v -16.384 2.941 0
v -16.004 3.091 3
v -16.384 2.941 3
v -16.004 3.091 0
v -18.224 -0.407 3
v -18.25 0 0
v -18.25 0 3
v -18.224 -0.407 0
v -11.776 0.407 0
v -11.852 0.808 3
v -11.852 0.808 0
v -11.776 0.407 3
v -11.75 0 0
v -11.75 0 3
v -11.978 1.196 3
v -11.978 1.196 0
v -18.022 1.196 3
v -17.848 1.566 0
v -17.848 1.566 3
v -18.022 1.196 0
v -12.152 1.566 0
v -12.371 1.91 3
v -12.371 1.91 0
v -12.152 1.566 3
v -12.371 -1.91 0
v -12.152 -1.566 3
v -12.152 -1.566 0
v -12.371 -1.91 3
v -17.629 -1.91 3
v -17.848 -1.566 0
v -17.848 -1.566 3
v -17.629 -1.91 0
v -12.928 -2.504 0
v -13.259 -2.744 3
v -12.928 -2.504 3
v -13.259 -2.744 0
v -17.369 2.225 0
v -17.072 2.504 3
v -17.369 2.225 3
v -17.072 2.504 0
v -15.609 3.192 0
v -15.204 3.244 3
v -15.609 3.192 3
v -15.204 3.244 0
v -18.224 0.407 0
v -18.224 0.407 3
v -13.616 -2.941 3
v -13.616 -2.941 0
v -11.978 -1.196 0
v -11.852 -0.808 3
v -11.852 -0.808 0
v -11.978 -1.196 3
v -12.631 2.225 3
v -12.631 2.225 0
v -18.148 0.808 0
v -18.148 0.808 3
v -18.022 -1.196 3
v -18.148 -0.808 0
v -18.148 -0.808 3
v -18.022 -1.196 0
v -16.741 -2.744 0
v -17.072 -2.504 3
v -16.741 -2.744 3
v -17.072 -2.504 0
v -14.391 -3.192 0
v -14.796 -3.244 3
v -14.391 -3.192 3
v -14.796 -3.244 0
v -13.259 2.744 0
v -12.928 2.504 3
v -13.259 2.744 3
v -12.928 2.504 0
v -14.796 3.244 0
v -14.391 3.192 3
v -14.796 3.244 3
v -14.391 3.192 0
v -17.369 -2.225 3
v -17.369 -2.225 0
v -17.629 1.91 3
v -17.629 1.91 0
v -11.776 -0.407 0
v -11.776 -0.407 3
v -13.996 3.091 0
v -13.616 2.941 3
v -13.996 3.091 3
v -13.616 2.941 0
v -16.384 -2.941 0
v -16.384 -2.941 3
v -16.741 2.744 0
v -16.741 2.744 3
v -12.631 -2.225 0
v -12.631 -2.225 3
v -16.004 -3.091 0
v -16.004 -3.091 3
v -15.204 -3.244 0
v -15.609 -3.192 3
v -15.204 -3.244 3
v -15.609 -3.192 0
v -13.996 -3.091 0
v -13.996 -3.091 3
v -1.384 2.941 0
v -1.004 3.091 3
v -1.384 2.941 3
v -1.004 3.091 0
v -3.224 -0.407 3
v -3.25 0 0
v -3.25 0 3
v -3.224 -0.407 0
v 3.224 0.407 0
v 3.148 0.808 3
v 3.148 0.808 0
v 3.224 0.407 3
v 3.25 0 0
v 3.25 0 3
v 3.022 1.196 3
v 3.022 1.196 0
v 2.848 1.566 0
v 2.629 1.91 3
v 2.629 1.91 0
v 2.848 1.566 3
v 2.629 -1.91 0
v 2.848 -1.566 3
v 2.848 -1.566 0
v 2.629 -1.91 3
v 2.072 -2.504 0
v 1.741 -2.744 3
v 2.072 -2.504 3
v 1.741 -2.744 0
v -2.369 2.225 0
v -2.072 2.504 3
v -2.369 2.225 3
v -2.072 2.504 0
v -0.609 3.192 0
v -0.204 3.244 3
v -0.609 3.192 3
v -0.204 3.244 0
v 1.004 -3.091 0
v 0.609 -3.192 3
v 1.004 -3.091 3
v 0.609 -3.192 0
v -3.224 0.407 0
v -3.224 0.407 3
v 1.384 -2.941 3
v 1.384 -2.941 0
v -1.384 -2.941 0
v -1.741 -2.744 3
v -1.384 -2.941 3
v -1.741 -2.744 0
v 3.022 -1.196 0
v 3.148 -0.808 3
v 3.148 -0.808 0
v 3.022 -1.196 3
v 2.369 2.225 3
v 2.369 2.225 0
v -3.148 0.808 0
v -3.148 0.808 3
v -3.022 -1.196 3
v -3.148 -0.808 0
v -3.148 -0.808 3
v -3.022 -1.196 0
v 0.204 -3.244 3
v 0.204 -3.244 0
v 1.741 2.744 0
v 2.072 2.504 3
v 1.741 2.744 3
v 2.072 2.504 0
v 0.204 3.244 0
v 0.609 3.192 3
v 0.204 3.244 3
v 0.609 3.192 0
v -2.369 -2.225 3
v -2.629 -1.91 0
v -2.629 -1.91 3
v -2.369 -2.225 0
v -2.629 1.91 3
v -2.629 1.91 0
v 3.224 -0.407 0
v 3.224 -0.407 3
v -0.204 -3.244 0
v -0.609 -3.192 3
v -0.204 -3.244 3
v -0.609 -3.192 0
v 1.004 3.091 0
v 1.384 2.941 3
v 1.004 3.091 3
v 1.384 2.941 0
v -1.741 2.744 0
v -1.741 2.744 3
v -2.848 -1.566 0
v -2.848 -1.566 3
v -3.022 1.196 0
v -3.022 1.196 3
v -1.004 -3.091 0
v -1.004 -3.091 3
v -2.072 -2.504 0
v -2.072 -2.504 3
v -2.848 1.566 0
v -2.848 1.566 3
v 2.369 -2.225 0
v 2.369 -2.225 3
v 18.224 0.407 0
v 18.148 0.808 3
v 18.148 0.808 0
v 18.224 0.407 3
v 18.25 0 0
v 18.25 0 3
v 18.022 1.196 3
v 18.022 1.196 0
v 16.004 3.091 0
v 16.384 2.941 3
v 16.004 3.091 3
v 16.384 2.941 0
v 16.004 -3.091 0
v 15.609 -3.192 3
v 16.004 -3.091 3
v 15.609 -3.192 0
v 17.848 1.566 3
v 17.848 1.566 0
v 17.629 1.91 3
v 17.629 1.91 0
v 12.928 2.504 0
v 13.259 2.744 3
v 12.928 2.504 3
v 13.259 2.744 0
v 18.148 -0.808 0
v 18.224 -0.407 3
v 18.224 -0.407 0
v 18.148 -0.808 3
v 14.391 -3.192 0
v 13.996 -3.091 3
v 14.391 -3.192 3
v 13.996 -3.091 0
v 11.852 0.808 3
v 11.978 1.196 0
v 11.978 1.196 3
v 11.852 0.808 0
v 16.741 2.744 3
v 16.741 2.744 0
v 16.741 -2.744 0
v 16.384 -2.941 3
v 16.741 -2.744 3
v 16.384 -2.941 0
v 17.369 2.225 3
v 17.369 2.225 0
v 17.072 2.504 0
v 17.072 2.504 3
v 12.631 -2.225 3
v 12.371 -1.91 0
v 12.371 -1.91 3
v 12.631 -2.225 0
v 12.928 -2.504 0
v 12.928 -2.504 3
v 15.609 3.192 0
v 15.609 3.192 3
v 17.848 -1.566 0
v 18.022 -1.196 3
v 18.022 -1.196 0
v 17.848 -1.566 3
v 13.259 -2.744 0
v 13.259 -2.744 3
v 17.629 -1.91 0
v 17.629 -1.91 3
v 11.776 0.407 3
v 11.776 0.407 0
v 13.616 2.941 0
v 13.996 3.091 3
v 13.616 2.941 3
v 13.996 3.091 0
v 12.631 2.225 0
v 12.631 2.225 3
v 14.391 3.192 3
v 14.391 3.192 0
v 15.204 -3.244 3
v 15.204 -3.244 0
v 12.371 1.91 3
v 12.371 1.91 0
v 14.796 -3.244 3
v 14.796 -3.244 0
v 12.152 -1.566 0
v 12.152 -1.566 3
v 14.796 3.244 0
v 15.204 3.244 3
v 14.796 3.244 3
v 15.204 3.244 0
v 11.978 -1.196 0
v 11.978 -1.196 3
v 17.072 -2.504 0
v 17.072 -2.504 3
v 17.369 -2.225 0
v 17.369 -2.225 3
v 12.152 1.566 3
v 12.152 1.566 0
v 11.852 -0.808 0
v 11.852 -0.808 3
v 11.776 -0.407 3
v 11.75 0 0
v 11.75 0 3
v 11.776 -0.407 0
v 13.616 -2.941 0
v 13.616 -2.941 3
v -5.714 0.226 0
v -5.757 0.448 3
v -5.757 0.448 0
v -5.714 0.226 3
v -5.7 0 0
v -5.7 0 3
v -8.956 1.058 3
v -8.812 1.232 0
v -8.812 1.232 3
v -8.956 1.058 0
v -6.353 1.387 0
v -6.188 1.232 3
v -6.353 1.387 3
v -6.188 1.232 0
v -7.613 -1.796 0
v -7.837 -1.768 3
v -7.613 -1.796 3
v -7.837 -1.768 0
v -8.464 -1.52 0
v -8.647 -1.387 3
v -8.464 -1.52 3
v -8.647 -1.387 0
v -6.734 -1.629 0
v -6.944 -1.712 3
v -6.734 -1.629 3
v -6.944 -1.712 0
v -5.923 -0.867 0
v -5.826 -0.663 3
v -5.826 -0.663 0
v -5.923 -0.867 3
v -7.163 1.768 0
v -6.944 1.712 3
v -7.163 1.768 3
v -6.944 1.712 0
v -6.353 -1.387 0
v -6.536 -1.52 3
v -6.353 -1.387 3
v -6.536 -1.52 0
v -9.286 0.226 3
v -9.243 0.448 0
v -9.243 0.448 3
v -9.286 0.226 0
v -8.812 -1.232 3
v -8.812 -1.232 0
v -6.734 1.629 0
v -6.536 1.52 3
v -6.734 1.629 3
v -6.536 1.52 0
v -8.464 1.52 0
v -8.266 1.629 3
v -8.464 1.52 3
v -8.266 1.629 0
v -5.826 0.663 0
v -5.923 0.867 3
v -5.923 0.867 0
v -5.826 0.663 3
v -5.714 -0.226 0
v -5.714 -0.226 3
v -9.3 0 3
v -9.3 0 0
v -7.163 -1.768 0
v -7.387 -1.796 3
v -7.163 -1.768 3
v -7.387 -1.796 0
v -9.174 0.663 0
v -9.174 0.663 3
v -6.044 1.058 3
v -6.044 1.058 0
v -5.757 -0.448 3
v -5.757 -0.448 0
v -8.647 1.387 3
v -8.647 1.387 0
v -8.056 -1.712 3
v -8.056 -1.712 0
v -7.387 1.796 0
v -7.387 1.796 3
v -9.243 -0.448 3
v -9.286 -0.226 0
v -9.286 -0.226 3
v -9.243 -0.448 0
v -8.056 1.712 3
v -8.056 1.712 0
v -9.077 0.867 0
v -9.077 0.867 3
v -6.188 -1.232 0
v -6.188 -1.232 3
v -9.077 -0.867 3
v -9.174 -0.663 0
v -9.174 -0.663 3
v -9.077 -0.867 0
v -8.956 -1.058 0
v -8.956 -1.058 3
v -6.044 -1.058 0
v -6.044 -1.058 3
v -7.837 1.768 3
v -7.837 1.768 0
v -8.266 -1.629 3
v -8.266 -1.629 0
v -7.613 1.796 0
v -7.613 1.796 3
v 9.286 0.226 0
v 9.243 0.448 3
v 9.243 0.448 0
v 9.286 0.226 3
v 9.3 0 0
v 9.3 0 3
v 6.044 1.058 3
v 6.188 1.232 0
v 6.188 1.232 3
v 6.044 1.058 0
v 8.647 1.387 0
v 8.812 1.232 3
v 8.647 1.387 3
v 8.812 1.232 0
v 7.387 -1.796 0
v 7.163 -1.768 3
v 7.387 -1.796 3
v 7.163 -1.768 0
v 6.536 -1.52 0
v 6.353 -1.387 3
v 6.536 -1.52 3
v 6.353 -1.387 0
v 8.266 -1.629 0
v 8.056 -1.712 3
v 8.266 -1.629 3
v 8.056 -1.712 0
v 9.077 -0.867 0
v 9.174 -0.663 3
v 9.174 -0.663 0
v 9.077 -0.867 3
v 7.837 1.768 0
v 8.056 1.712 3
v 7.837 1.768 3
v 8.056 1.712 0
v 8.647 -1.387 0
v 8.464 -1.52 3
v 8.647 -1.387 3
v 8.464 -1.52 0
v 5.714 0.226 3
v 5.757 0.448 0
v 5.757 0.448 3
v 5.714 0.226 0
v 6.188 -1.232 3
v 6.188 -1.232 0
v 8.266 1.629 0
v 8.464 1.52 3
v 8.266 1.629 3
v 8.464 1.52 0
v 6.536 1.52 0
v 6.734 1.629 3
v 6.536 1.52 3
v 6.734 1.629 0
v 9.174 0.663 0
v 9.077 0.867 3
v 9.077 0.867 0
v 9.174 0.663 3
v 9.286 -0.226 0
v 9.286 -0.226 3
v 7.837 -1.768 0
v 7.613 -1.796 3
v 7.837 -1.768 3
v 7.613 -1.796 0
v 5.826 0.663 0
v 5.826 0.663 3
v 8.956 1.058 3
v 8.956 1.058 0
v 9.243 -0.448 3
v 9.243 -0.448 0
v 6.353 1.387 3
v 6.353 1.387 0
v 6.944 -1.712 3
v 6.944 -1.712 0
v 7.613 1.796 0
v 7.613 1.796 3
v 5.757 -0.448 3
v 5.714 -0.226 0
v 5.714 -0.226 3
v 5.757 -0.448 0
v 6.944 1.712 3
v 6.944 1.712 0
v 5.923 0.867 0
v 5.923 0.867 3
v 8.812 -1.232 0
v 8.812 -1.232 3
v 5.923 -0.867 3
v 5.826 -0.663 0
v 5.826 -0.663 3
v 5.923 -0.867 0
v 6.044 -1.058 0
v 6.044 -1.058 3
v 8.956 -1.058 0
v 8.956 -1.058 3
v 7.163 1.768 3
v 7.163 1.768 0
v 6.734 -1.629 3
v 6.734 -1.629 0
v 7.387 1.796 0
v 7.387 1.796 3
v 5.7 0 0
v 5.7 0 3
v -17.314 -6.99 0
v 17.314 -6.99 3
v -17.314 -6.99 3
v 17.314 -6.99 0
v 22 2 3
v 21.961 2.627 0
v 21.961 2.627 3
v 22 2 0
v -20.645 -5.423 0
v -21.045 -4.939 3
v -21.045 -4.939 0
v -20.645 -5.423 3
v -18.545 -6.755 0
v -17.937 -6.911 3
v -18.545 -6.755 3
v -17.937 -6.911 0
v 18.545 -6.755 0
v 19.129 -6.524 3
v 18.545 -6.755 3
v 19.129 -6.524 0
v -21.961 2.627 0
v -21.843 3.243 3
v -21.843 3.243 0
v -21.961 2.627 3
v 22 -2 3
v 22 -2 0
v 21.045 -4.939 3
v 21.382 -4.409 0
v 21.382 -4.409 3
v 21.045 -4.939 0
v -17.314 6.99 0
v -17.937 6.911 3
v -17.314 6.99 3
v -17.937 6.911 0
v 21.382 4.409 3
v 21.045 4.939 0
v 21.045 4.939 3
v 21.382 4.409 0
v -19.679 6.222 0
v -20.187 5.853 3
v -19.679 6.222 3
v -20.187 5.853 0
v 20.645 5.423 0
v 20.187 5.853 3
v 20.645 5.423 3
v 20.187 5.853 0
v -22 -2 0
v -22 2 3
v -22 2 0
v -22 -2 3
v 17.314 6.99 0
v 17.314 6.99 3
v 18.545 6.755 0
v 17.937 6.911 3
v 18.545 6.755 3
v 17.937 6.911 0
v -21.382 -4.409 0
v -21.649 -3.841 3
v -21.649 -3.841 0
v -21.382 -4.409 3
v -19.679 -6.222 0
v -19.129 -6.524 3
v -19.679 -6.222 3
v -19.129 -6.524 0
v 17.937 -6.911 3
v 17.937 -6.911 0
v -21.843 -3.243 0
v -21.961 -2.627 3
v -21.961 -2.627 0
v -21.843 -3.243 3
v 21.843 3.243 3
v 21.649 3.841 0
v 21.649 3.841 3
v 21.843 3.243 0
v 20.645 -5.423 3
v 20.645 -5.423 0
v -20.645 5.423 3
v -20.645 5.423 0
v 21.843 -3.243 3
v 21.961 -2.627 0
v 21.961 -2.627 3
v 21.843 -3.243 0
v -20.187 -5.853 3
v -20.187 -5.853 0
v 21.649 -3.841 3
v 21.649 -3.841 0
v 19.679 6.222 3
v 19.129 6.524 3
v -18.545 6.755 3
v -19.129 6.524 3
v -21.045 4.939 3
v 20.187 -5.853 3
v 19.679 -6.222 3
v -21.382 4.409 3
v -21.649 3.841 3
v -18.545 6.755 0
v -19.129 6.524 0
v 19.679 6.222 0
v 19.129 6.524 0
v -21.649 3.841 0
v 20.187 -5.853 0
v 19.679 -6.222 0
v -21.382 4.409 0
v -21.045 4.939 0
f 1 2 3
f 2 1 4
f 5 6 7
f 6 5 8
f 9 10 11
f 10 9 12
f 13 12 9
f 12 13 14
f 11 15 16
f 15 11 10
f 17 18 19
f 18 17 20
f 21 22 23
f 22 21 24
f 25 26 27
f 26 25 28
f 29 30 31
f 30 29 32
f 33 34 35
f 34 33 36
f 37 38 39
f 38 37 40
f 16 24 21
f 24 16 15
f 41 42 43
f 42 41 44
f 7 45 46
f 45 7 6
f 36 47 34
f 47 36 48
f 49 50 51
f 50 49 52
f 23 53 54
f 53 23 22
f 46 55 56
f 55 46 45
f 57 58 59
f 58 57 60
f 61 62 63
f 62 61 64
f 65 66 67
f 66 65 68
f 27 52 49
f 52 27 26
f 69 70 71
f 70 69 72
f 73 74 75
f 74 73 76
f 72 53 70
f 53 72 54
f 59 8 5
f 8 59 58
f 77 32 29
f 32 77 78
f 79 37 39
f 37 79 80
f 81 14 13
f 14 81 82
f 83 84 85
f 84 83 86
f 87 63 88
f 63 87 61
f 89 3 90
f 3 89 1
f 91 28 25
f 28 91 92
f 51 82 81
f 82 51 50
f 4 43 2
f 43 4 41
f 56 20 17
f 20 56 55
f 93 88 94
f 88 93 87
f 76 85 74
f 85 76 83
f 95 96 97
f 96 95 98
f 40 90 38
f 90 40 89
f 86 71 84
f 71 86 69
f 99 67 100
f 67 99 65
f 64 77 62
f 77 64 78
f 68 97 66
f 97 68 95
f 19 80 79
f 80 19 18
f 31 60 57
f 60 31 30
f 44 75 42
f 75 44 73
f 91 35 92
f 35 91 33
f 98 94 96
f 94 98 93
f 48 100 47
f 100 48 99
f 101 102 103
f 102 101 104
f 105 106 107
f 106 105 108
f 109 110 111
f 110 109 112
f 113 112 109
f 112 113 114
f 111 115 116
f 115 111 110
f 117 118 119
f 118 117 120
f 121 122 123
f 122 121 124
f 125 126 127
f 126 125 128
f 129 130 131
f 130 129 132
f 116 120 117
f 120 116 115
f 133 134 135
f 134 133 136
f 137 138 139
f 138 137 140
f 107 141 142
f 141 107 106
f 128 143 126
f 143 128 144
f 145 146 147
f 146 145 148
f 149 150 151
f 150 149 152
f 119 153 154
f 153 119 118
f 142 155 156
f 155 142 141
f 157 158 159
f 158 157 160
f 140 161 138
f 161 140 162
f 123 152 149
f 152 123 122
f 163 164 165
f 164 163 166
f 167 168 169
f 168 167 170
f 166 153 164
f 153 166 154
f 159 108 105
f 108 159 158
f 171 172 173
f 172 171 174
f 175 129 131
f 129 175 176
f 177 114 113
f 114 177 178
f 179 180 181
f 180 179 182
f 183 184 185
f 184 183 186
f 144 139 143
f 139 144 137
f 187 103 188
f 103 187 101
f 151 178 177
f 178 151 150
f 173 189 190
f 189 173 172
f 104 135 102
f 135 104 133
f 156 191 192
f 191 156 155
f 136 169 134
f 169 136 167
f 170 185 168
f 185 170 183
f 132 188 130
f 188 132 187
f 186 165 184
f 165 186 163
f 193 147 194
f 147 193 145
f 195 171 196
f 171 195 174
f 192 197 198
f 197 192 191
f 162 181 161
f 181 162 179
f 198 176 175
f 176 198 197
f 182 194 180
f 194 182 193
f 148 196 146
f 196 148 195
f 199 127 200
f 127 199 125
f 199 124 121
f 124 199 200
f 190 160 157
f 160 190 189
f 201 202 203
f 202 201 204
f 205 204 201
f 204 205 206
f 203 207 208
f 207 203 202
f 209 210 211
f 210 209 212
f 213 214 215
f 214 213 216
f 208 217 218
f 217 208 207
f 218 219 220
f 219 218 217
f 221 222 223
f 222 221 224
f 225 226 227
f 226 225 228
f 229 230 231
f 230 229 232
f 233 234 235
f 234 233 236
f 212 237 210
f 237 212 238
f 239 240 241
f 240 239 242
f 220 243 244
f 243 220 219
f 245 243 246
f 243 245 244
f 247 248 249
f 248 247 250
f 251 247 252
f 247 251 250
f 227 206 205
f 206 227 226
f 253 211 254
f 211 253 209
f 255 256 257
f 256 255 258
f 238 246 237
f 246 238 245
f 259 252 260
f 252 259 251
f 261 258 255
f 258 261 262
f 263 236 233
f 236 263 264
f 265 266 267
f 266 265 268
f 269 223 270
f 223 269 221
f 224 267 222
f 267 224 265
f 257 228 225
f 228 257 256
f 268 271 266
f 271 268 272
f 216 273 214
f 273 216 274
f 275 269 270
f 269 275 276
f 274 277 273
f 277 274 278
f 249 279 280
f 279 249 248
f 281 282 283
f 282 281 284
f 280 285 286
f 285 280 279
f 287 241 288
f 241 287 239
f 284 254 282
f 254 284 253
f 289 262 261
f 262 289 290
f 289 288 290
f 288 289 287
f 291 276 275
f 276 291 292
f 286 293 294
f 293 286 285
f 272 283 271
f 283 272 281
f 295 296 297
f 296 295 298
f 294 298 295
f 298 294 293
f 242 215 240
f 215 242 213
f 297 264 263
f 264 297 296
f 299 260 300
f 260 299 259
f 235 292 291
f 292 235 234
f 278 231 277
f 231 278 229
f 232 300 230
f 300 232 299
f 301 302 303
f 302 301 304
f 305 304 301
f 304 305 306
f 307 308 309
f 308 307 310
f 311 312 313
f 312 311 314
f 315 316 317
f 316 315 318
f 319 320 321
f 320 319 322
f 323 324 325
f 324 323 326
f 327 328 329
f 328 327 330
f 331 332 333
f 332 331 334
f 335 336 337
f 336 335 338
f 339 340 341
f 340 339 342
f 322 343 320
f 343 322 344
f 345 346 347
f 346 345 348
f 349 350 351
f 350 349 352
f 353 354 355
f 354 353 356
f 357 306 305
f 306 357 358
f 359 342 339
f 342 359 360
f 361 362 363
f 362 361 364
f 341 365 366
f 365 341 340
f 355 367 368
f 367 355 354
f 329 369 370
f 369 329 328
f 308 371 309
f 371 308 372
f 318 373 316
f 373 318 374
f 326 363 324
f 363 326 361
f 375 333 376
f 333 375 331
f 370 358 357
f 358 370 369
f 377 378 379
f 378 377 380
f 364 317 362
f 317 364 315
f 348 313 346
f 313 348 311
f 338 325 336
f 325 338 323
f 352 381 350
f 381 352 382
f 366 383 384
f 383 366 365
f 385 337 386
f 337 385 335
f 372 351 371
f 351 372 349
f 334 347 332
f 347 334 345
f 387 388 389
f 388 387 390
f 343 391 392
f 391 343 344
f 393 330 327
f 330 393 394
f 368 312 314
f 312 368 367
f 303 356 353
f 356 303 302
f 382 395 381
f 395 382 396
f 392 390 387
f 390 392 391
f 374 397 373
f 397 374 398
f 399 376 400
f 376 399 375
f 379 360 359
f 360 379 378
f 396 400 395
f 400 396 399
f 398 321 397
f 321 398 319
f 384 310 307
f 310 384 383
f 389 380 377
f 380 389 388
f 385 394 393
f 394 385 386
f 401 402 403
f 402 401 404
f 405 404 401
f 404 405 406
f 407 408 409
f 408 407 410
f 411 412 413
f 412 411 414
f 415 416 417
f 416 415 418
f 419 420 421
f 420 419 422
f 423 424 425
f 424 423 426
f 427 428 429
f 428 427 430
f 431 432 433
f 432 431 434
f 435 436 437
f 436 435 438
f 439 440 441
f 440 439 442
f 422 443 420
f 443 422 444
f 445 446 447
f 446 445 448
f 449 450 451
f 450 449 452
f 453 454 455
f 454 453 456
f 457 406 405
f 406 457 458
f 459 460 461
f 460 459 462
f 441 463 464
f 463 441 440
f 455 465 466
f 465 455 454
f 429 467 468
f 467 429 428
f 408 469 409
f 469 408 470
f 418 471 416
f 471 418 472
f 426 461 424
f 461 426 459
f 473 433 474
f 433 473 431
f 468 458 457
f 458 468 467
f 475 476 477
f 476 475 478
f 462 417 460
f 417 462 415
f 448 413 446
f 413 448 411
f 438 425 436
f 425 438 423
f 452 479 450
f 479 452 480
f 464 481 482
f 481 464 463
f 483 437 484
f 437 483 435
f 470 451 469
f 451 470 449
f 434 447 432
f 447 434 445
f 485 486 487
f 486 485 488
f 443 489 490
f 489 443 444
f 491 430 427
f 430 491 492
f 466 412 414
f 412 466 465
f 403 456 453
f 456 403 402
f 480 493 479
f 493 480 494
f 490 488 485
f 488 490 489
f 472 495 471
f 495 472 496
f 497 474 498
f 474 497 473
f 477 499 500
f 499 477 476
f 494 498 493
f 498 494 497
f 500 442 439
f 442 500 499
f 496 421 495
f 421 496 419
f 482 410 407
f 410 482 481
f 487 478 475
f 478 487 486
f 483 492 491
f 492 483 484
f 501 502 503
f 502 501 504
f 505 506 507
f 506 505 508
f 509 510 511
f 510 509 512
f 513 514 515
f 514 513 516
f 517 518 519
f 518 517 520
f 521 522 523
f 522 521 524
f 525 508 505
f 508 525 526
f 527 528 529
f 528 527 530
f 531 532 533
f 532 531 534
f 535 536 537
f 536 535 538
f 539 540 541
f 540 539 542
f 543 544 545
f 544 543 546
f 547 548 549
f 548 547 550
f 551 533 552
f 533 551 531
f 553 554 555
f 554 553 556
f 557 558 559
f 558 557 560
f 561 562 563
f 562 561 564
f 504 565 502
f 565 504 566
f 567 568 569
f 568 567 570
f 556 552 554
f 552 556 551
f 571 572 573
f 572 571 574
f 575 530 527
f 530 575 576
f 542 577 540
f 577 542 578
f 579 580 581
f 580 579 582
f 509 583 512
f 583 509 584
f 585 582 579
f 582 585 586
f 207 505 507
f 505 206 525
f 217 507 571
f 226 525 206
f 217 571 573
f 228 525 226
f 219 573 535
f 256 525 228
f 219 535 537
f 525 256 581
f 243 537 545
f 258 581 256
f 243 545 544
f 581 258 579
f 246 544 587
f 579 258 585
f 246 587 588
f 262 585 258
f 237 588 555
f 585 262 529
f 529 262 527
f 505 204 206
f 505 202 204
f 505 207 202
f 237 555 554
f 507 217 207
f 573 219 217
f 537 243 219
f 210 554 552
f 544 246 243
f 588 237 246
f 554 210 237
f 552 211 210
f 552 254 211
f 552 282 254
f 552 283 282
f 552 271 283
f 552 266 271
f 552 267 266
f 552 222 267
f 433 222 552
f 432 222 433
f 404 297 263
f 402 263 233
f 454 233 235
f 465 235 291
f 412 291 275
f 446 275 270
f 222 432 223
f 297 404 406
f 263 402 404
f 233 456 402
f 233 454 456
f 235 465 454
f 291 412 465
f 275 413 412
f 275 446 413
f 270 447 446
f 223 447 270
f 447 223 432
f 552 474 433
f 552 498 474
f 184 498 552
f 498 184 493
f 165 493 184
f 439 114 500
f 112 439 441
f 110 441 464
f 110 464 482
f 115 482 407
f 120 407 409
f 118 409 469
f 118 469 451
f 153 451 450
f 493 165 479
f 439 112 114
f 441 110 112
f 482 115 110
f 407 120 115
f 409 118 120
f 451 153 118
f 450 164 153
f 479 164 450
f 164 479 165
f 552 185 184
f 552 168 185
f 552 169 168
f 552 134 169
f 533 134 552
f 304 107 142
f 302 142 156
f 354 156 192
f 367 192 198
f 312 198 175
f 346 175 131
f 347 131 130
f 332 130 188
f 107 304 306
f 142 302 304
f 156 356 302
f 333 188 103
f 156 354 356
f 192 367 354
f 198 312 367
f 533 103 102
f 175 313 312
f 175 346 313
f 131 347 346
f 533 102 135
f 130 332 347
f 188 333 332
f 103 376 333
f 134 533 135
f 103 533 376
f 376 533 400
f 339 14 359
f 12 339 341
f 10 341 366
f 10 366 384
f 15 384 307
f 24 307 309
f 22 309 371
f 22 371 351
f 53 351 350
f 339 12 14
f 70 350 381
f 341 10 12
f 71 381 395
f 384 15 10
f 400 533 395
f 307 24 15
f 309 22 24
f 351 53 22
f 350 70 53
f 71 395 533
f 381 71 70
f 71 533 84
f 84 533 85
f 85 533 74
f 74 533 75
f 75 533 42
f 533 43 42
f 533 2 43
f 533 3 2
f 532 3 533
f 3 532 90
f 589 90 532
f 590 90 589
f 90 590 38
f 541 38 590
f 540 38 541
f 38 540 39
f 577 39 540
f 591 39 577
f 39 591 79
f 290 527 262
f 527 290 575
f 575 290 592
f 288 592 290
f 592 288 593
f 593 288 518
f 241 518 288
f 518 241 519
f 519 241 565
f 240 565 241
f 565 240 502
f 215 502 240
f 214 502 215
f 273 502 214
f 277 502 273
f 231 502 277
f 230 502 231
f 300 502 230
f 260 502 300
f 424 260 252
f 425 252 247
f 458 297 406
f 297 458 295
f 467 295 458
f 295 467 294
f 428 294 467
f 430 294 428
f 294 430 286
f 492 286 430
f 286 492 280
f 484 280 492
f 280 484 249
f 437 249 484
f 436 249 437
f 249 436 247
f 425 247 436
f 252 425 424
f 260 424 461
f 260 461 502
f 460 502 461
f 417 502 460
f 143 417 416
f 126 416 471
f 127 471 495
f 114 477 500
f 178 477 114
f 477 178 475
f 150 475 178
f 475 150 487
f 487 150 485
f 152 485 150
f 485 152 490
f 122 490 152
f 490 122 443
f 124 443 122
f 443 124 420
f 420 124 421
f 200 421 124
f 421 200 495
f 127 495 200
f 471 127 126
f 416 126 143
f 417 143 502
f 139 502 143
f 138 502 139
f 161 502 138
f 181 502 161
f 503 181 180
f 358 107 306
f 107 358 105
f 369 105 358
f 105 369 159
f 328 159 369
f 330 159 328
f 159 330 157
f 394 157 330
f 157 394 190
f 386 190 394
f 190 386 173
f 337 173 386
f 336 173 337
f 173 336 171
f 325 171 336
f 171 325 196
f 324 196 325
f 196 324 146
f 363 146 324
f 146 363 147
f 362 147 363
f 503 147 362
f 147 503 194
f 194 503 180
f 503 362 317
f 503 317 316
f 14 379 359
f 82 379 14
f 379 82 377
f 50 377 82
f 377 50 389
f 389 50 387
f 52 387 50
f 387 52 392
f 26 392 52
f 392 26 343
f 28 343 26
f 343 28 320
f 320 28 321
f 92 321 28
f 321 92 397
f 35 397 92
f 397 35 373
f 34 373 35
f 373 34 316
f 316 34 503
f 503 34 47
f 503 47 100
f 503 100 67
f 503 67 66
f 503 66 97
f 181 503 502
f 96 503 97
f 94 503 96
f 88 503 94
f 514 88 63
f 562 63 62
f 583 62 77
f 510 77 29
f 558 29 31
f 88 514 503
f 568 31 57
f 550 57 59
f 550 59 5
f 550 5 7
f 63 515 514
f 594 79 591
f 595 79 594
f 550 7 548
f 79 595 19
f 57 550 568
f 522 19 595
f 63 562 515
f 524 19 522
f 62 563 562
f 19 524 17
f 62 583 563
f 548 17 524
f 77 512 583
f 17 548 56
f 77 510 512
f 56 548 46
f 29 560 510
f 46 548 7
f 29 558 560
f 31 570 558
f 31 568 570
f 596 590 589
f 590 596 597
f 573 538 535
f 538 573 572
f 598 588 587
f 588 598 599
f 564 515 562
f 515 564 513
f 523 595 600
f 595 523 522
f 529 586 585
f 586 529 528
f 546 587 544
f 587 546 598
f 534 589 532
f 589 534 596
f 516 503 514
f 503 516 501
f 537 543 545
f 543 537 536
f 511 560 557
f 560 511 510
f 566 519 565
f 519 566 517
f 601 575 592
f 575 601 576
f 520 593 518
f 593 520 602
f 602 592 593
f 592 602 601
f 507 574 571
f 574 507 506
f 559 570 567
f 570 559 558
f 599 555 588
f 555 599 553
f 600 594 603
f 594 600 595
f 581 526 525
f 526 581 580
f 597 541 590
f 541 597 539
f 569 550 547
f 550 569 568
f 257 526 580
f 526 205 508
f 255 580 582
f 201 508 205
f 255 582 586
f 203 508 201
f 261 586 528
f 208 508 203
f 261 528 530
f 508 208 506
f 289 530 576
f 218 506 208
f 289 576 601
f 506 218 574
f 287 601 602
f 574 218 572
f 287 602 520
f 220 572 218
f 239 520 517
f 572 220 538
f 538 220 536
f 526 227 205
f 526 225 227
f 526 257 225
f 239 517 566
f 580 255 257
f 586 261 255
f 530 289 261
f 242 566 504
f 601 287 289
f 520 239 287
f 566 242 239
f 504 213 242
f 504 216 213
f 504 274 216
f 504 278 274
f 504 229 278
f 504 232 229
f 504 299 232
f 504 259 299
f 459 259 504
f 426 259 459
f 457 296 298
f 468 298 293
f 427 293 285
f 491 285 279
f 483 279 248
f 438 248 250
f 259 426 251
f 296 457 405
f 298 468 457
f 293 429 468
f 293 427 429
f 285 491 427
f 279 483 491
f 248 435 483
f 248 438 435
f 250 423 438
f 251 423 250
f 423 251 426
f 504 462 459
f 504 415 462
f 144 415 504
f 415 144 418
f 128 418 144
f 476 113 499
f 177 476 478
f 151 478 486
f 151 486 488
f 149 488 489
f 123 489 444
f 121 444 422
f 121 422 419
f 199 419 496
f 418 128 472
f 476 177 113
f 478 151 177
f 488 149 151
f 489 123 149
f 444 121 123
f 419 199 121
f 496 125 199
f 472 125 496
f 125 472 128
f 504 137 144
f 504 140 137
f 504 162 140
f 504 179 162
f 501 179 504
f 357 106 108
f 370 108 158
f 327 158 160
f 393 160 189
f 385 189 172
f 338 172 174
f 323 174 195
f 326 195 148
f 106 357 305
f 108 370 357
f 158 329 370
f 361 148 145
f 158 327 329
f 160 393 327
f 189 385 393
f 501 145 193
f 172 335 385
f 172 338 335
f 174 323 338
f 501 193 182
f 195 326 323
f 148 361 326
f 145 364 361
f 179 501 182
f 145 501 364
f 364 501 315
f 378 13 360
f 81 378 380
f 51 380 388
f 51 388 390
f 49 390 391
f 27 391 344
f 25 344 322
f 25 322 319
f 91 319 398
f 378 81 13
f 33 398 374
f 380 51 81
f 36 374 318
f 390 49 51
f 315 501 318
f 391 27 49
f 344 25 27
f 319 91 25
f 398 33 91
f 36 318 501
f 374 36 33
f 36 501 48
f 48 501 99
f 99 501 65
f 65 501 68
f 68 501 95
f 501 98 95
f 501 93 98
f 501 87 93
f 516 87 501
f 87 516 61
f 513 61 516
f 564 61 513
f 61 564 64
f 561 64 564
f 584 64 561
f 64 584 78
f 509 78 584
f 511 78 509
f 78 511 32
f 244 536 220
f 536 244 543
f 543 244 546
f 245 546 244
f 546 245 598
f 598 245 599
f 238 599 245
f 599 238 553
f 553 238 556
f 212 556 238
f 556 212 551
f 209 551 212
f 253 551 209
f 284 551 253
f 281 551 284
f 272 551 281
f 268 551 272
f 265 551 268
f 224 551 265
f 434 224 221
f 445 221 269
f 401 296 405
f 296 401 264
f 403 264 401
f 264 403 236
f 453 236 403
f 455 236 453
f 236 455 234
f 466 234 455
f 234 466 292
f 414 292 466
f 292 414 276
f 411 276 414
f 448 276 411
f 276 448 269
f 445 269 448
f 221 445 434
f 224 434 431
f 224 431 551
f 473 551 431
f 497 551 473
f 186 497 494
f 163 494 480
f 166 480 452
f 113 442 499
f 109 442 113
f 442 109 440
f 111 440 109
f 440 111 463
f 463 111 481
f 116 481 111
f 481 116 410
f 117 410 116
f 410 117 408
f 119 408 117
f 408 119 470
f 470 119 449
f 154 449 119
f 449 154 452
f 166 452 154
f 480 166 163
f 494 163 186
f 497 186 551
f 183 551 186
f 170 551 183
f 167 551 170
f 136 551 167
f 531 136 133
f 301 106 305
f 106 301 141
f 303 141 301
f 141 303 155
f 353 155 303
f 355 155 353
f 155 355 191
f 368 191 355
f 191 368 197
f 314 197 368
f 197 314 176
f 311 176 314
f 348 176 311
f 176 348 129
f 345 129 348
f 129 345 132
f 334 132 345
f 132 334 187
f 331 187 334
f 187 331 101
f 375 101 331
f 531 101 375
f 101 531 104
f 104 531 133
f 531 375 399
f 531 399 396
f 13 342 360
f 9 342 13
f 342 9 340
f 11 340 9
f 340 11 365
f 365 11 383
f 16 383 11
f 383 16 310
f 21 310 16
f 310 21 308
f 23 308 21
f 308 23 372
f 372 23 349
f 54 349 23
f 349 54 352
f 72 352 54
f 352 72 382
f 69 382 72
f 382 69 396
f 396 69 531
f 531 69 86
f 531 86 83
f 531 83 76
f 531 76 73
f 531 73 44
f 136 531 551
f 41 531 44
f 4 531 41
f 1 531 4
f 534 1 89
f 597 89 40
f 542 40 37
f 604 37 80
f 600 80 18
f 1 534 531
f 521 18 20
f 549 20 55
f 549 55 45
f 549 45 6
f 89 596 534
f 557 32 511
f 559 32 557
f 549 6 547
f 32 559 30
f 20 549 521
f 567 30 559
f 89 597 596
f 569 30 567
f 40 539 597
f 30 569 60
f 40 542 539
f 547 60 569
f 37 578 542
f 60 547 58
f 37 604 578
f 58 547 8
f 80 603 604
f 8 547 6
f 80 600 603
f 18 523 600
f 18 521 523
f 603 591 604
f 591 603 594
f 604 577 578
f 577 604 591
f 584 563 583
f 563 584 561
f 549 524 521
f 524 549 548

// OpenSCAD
$fn = 50;

difference() {
	union() {
		hull() {
			translate(v = [-17.0, 2.0, 0]) {
				cylinder(h = 3, r = 5);
			}
			translate(v = [17.0, 2.0, 0]) {
				cylinder(h = 3, r = 5);
			}
			translate(v = [-17.0, -2.0, 0]) {
				cylinder(h = 3, r = 5);
			}
			translate(v = [17.0, -2.0, 0]) {
				cylinder(h = 3, r = 5);
			}
		}
	}
	union() {
		translate(v = [-15.0, 0.0, 0]) {
			translate(v = [0, 0, -100]) {
				cylinder(h = 200, r = 3.25);
			}
		}
		translate(v = [0, 0, -100]) {
			cylinder(h = 200, r = 3.25);
		}
		translate(v = [15.0, 0.0, 0]) {
			translate(v = [0, 0, -100]) {
				cylinder(h = 200, r = 3.25);
			}
		}
		translate(v = [-15.0, 0.0, 0]) {
			translate(v = [0, 0, -100]) {
				cylinder(h = 200, r = 1.8);
			}
		}
		translate(v = [-7.5, 0.0, 0]) {
			translate(v = [0, 0, -100]) {
				cylinder(h = 200, r = 1.8);
			}
		}
		translate(v = [0, 0, -100]) {
			cylinder(h = 200, r = 1.8);
		}
		translate(v = [7.5, 0.0, 0]) {
			translate(v = [0, 0, -100]) {
				cylinder(h = 200, r = 1.8);
			}
		}
		translate(v = [15.0, 0.0, 0]) {
			translate(v = [0, 0, -100]) {
				cylinder(h = 200, r = 1.8);
			}
		}
	}
}
